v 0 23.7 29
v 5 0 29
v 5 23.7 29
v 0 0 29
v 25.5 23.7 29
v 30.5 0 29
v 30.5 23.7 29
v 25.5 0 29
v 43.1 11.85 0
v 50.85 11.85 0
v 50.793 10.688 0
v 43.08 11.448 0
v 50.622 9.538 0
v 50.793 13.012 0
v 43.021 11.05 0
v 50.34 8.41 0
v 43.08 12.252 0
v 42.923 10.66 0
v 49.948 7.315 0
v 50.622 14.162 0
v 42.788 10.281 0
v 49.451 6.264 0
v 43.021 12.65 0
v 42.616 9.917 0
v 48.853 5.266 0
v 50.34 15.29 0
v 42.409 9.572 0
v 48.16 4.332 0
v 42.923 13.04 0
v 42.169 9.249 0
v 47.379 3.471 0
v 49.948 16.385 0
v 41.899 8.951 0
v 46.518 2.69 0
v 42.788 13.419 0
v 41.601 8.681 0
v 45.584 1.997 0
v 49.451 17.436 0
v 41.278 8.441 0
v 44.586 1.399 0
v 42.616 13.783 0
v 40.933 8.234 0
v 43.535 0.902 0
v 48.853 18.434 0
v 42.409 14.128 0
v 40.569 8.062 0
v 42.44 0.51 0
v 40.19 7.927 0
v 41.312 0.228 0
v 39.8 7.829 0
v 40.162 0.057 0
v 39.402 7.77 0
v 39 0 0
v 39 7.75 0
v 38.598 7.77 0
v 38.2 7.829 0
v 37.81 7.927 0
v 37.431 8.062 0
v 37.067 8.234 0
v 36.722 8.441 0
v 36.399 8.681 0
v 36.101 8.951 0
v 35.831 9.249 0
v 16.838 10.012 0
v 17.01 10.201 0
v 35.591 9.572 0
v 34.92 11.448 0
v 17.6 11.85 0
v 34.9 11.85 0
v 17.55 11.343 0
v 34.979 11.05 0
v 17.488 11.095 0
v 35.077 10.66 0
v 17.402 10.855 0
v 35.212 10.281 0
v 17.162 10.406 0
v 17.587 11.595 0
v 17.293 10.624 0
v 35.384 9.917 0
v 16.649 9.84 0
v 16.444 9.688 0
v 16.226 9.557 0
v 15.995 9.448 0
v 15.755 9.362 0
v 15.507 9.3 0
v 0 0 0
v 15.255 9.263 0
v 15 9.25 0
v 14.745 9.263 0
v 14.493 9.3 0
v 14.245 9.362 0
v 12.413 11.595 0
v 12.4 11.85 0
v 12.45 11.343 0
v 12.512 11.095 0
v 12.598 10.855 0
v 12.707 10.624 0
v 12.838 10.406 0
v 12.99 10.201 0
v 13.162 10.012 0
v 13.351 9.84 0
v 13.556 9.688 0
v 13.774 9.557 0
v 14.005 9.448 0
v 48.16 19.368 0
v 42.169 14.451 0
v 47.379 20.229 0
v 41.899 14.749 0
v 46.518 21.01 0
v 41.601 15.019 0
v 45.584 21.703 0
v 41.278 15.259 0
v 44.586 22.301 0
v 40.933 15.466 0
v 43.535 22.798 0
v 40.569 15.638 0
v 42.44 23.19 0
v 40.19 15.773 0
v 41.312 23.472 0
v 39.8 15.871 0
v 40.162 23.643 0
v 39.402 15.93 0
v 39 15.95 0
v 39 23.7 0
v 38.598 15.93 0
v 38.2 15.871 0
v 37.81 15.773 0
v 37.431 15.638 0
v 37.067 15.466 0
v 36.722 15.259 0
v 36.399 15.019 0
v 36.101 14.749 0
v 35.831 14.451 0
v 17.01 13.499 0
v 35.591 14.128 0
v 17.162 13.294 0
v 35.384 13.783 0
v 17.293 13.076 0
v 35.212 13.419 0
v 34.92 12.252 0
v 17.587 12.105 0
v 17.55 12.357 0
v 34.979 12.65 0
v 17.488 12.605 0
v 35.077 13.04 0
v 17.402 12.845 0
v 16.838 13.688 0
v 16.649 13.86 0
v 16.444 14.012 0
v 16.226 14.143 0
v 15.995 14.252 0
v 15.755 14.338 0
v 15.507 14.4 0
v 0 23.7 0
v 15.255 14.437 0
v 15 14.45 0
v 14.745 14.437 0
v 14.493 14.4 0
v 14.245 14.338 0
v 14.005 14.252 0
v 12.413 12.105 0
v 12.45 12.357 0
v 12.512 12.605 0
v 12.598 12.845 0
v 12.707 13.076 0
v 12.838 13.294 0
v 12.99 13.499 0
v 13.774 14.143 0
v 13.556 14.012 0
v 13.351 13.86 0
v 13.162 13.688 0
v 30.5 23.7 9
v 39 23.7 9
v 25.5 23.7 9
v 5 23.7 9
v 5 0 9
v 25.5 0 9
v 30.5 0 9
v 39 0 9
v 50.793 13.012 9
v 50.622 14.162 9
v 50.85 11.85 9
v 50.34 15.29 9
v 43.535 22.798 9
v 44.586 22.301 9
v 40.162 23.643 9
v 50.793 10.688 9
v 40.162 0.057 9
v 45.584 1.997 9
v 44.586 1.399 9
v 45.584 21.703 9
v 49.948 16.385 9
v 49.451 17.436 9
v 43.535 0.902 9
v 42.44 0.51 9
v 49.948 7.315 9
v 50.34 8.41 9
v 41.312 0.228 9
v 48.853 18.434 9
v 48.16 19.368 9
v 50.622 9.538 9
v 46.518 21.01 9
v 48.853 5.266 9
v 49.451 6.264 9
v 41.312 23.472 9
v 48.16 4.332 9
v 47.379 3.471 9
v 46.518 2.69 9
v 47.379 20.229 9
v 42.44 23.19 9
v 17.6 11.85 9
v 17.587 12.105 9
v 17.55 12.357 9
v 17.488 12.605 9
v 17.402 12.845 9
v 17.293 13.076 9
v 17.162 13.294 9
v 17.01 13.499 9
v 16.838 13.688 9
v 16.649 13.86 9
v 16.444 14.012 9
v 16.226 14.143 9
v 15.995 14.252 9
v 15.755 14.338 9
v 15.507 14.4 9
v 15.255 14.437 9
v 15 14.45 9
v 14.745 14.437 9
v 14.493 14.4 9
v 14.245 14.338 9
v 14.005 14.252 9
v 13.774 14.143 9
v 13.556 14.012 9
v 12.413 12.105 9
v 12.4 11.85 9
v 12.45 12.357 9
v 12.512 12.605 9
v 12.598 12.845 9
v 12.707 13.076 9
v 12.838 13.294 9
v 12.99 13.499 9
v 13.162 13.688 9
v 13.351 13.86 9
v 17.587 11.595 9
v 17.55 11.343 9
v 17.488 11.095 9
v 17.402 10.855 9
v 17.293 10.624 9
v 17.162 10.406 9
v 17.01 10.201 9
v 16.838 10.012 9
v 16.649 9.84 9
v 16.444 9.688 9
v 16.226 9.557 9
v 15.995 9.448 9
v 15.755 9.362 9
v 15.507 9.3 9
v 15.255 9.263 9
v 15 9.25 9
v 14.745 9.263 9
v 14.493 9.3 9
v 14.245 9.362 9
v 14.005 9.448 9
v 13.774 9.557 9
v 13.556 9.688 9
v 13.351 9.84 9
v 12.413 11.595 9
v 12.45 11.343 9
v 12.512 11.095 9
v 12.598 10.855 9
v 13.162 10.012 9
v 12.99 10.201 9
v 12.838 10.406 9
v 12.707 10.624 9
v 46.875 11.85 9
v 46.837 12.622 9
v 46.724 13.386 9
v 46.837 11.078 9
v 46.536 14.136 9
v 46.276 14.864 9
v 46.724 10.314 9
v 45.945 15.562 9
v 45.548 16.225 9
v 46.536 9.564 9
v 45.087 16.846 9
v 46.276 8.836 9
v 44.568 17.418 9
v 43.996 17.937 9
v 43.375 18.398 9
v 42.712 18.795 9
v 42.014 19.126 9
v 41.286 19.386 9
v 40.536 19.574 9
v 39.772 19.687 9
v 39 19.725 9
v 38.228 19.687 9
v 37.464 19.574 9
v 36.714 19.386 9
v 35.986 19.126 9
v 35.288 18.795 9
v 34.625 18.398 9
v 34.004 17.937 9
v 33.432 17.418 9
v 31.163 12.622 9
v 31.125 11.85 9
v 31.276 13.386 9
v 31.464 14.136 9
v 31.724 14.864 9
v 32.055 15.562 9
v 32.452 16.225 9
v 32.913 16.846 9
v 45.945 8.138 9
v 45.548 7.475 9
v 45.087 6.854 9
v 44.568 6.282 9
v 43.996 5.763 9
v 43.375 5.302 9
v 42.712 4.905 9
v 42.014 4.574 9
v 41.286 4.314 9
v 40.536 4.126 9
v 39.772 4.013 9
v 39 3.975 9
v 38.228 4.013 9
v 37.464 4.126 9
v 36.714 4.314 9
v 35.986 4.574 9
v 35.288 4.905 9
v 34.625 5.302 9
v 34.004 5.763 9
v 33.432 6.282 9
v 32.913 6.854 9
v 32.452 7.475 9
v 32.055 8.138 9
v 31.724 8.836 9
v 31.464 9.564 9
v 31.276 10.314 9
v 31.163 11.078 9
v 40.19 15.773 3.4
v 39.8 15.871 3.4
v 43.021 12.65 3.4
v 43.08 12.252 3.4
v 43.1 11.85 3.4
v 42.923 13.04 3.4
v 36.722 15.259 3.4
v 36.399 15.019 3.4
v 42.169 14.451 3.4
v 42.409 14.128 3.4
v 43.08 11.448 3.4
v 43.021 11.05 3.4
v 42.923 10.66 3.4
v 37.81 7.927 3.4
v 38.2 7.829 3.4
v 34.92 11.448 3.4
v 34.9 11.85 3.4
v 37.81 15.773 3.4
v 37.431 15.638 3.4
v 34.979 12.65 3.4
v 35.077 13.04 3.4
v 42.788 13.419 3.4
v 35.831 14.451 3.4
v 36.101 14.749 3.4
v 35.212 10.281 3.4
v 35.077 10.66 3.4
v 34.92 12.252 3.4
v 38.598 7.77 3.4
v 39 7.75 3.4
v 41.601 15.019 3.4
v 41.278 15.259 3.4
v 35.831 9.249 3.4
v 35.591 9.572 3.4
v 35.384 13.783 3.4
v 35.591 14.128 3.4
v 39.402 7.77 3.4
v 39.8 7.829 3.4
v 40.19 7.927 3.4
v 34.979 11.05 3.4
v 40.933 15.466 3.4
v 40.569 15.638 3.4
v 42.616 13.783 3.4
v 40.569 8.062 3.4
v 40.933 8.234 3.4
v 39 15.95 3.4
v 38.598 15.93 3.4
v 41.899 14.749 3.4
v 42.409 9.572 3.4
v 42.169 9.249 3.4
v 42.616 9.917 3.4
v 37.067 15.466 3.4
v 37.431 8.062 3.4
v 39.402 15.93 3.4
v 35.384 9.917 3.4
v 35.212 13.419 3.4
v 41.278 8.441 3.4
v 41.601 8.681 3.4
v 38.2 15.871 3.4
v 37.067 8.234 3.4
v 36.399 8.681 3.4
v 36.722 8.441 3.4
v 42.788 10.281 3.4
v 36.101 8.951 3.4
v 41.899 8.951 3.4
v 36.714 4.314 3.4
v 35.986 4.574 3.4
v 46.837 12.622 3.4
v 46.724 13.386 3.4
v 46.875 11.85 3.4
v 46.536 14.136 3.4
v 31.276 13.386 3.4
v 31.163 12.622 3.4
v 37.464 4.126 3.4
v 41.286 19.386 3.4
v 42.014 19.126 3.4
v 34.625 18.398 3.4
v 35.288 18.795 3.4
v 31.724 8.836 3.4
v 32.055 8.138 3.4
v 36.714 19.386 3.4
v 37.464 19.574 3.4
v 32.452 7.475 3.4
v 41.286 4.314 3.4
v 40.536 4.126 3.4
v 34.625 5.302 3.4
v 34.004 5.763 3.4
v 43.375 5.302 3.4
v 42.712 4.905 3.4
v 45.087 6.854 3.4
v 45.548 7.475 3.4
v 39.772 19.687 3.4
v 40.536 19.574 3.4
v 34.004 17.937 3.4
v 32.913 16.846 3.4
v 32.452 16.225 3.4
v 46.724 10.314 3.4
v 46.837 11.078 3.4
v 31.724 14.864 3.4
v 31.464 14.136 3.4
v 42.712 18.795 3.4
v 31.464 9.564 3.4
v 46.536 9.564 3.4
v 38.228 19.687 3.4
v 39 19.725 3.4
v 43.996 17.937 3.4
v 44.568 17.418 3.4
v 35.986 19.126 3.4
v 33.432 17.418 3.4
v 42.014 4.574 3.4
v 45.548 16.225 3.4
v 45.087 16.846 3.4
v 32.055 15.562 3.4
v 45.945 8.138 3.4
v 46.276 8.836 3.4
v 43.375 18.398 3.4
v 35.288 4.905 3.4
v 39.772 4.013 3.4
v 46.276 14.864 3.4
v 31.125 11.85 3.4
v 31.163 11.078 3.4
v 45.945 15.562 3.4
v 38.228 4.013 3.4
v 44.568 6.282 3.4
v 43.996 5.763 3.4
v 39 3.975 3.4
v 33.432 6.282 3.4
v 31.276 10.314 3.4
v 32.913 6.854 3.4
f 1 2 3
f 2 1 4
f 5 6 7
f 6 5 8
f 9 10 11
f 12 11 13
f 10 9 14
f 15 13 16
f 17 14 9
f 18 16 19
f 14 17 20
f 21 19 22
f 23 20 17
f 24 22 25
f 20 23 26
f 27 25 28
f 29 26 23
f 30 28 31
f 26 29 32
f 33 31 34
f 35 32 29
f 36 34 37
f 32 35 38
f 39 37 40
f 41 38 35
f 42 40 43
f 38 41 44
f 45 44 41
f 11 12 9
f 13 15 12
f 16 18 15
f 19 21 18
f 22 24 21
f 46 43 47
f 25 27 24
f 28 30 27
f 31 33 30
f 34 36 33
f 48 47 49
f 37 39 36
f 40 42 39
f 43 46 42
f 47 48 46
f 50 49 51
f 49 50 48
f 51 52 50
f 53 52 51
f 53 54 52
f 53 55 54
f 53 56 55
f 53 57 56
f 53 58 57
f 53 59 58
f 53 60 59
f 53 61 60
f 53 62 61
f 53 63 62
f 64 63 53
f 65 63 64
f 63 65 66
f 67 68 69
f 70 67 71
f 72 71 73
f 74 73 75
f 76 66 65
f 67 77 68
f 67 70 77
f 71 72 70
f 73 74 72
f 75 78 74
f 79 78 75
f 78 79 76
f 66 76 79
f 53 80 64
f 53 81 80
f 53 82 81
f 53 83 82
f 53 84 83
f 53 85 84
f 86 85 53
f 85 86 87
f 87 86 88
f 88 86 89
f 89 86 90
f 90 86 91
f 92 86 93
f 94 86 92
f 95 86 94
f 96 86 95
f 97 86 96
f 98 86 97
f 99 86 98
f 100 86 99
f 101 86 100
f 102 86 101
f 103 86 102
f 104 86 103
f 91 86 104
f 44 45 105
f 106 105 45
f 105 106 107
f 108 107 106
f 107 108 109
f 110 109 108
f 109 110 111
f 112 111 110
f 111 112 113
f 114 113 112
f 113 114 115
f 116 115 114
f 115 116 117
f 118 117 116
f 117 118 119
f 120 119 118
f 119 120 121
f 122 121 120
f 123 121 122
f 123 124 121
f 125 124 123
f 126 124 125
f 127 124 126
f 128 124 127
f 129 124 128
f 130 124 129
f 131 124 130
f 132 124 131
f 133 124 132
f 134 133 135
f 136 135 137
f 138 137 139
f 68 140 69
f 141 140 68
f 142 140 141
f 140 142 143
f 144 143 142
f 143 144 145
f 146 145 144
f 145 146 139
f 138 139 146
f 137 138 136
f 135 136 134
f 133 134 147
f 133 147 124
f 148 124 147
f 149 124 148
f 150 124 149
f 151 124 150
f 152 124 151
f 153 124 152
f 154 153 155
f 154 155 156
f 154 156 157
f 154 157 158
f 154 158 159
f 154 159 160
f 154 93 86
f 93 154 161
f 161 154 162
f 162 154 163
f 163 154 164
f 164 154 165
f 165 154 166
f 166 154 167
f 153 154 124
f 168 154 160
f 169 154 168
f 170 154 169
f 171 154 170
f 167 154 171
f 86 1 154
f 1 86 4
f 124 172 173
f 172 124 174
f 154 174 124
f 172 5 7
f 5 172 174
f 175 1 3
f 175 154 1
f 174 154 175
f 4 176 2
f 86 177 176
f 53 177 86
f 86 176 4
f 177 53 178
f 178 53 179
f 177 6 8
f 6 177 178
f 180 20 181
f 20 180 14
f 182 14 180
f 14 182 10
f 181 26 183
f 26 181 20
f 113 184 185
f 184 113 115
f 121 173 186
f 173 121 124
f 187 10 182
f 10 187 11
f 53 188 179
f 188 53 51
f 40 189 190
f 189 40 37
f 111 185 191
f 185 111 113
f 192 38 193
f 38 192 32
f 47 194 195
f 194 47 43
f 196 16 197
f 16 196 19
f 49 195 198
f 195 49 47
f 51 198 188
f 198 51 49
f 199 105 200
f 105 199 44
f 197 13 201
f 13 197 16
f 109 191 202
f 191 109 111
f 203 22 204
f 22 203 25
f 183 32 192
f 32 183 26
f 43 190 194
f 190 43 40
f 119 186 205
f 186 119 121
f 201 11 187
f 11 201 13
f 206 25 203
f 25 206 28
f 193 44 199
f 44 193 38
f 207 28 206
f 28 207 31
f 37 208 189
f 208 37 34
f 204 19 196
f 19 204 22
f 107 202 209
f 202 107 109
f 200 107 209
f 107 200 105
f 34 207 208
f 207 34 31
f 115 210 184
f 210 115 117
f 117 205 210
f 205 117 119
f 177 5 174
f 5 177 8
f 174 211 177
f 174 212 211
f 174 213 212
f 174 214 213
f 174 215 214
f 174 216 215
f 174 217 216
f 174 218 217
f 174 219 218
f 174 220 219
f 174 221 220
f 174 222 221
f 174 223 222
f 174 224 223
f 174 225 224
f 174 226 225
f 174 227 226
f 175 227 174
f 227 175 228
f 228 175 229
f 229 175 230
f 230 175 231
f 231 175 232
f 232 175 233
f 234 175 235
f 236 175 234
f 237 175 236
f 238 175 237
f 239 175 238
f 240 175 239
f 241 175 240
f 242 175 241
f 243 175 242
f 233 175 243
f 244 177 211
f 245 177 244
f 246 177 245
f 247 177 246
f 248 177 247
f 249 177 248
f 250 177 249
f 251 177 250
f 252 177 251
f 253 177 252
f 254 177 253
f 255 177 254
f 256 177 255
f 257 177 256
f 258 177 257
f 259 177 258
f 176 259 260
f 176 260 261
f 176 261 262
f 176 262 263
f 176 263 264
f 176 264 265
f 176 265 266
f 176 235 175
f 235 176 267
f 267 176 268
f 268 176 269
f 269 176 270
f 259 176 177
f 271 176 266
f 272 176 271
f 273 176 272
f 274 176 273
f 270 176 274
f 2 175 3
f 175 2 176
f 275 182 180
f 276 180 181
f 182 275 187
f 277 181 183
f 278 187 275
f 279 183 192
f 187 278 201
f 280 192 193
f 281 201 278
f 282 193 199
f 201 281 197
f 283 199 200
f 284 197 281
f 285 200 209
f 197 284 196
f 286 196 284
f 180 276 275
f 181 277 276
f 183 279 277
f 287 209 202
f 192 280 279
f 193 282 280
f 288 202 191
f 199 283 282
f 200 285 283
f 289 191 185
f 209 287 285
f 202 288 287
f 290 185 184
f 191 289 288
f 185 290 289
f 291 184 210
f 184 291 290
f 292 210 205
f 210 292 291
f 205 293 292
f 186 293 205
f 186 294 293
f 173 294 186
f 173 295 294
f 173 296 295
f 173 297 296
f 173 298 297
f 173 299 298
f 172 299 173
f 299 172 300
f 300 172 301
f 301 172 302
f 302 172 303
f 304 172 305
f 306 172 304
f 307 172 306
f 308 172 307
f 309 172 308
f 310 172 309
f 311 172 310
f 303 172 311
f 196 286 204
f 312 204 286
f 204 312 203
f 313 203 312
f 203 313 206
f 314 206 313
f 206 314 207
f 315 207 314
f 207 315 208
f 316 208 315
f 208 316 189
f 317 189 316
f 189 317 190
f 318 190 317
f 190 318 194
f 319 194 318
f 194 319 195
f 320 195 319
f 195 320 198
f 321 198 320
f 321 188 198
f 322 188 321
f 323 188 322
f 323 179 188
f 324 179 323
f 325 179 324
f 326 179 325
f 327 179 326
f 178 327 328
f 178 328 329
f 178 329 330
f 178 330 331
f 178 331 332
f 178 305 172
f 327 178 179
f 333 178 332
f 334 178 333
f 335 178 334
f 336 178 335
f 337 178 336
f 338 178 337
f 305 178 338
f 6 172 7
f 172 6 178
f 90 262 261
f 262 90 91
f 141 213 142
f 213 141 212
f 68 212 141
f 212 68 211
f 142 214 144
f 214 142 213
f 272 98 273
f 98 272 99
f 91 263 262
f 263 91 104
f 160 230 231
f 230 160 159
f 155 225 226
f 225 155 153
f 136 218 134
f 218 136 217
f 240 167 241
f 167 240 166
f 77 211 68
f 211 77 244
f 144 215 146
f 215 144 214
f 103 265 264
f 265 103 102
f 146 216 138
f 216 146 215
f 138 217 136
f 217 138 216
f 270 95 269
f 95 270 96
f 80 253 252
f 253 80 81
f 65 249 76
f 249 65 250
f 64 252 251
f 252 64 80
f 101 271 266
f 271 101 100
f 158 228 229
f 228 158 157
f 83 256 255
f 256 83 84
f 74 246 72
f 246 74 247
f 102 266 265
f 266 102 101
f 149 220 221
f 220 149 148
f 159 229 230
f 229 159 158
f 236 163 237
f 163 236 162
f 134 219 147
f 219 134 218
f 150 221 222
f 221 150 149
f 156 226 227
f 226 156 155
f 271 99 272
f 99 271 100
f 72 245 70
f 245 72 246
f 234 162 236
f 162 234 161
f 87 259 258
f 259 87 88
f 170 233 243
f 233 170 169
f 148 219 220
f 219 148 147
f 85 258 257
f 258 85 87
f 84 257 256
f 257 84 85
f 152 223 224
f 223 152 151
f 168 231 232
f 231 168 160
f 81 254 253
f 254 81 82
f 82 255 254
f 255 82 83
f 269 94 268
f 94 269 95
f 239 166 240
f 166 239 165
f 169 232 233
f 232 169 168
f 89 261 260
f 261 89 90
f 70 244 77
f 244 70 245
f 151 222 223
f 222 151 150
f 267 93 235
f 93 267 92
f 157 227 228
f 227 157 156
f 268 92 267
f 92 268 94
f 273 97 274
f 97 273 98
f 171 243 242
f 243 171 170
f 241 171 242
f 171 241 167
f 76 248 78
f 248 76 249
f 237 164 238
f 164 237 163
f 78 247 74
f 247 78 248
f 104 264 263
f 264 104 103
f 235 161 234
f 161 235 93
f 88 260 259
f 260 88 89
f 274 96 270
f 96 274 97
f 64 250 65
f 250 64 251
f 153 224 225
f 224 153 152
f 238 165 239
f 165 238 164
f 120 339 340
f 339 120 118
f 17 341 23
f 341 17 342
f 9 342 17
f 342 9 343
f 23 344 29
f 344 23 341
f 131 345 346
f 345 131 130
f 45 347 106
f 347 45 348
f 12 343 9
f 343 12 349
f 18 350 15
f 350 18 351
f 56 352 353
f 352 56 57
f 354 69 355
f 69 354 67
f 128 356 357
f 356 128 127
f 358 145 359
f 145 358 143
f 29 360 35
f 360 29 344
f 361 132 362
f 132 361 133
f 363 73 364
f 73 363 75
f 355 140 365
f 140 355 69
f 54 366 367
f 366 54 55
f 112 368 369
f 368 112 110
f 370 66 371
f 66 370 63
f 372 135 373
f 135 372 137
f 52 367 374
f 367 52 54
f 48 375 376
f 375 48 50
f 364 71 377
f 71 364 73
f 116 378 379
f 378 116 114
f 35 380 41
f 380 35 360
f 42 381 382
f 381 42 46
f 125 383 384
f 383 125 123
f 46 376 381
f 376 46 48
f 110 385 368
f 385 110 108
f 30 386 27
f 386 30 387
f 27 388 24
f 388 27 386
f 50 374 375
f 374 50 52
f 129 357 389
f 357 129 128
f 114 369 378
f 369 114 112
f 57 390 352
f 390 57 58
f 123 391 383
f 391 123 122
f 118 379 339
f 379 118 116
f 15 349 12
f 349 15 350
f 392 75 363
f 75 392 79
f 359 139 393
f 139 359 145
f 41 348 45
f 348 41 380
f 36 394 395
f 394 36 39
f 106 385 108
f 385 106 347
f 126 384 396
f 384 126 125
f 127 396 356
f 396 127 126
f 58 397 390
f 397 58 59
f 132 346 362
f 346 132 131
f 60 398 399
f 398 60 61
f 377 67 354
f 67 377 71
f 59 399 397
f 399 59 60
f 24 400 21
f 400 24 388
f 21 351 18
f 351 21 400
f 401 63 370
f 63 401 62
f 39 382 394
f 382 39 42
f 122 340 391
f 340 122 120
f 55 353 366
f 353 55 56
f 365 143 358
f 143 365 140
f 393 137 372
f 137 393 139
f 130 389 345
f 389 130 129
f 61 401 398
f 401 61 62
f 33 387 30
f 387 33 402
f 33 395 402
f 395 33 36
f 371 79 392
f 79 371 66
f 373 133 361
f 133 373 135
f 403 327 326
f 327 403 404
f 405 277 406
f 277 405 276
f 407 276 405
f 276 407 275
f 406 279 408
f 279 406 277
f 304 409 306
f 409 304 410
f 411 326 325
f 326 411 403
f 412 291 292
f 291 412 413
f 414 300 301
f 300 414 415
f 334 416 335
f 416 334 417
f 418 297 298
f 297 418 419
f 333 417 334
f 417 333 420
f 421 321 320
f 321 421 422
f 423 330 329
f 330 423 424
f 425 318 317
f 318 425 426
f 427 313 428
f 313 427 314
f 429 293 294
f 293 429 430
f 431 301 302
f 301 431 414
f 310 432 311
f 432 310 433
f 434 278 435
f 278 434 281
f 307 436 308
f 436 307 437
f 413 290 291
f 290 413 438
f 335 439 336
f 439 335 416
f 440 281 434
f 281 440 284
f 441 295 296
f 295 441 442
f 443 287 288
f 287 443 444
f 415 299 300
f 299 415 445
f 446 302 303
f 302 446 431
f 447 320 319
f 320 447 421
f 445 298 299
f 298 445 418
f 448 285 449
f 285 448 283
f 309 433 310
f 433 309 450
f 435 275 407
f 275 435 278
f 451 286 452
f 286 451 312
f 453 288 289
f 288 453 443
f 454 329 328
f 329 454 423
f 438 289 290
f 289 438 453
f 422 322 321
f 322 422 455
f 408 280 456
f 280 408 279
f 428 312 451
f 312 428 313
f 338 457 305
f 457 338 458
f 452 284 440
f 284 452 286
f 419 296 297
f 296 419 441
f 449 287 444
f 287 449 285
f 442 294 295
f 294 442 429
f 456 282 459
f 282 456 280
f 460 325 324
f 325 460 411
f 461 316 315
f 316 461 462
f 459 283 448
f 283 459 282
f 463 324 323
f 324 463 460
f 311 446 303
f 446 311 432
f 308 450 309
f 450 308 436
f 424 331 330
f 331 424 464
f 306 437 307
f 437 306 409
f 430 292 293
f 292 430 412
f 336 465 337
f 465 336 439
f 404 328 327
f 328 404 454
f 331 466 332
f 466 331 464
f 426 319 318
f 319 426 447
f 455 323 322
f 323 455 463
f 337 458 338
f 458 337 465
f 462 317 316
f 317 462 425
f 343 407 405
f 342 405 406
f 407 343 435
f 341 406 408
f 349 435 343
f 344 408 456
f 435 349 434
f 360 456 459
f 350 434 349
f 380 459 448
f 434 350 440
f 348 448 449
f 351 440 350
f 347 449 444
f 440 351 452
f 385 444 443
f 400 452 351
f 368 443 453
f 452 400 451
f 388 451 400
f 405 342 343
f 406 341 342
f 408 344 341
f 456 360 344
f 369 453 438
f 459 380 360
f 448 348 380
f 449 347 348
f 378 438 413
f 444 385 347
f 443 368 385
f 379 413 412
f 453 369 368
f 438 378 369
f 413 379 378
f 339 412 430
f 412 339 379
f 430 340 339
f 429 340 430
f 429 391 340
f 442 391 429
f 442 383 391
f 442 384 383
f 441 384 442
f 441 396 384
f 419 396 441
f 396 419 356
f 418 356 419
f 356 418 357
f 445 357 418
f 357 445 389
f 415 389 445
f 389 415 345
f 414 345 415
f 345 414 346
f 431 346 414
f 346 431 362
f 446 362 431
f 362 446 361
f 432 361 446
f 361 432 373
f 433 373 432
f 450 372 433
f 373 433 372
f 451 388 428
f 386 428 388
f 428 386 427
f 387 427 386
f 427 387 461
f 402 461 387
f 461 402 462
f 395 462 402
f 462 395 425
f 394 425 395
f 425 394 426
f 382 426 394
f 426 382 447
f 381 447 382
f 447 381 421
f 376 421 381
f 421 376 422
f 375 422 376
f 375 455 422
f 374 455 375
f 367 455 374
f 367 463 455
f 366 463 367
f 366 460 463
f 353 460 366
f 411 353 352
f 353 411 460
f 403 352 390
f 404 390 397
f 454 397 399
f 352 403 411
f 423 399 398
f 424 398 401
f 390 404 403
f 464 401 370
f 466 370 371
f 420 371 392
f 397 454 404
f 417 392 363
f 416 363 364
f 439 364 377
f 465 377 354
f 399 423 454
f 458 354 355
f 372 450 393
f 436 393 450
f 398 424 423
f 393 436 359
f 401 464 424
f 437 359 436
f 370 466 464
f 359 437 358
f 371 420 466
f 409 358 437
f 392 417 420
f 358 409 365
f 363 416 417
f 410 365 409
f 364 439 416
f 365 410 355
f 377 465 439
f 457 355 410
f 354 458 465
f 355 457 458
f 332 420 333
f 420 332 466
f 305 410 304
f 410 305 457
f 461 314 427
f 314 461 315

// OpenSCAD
$fn = 64;

smallHolePos = 15.0;
width = 23.7;
height = 29.0;
bearingDiameterOuter = 15.75;
bearingDiameterInner = 8.2;
bearingPos = 39;

difference()
{
  union()
  {
    cube ([bearingPos, width, height]);
      
    translate ([bearingPos, width / 2, 0])
      cylinder (r = width / 2, h = height, center = false);
  }
  
  union()
  {
    //ciach
    translate ([5, 0, 9])
      cube ([20.5, width, height]);
      
    translate ([30.5, 0, 9])
      cube ([50, width, height]);
      
    translate ([smallHolePos, width / 2, 0])
      cylinder (r = 5.2 / 2, h = 10, center = false);
      
    //bearing cut
    translate ([bearingPos, width / 2, 0])
      cylinder (r = bearingDiameterInner / 2, h = 10, center = false); // center
      
    translate ([bearingPos, width / 2, 3.4])
      cylinder (r = bearingDiameterOuter / 2, h = 10, center = false); // outer
  }
}
